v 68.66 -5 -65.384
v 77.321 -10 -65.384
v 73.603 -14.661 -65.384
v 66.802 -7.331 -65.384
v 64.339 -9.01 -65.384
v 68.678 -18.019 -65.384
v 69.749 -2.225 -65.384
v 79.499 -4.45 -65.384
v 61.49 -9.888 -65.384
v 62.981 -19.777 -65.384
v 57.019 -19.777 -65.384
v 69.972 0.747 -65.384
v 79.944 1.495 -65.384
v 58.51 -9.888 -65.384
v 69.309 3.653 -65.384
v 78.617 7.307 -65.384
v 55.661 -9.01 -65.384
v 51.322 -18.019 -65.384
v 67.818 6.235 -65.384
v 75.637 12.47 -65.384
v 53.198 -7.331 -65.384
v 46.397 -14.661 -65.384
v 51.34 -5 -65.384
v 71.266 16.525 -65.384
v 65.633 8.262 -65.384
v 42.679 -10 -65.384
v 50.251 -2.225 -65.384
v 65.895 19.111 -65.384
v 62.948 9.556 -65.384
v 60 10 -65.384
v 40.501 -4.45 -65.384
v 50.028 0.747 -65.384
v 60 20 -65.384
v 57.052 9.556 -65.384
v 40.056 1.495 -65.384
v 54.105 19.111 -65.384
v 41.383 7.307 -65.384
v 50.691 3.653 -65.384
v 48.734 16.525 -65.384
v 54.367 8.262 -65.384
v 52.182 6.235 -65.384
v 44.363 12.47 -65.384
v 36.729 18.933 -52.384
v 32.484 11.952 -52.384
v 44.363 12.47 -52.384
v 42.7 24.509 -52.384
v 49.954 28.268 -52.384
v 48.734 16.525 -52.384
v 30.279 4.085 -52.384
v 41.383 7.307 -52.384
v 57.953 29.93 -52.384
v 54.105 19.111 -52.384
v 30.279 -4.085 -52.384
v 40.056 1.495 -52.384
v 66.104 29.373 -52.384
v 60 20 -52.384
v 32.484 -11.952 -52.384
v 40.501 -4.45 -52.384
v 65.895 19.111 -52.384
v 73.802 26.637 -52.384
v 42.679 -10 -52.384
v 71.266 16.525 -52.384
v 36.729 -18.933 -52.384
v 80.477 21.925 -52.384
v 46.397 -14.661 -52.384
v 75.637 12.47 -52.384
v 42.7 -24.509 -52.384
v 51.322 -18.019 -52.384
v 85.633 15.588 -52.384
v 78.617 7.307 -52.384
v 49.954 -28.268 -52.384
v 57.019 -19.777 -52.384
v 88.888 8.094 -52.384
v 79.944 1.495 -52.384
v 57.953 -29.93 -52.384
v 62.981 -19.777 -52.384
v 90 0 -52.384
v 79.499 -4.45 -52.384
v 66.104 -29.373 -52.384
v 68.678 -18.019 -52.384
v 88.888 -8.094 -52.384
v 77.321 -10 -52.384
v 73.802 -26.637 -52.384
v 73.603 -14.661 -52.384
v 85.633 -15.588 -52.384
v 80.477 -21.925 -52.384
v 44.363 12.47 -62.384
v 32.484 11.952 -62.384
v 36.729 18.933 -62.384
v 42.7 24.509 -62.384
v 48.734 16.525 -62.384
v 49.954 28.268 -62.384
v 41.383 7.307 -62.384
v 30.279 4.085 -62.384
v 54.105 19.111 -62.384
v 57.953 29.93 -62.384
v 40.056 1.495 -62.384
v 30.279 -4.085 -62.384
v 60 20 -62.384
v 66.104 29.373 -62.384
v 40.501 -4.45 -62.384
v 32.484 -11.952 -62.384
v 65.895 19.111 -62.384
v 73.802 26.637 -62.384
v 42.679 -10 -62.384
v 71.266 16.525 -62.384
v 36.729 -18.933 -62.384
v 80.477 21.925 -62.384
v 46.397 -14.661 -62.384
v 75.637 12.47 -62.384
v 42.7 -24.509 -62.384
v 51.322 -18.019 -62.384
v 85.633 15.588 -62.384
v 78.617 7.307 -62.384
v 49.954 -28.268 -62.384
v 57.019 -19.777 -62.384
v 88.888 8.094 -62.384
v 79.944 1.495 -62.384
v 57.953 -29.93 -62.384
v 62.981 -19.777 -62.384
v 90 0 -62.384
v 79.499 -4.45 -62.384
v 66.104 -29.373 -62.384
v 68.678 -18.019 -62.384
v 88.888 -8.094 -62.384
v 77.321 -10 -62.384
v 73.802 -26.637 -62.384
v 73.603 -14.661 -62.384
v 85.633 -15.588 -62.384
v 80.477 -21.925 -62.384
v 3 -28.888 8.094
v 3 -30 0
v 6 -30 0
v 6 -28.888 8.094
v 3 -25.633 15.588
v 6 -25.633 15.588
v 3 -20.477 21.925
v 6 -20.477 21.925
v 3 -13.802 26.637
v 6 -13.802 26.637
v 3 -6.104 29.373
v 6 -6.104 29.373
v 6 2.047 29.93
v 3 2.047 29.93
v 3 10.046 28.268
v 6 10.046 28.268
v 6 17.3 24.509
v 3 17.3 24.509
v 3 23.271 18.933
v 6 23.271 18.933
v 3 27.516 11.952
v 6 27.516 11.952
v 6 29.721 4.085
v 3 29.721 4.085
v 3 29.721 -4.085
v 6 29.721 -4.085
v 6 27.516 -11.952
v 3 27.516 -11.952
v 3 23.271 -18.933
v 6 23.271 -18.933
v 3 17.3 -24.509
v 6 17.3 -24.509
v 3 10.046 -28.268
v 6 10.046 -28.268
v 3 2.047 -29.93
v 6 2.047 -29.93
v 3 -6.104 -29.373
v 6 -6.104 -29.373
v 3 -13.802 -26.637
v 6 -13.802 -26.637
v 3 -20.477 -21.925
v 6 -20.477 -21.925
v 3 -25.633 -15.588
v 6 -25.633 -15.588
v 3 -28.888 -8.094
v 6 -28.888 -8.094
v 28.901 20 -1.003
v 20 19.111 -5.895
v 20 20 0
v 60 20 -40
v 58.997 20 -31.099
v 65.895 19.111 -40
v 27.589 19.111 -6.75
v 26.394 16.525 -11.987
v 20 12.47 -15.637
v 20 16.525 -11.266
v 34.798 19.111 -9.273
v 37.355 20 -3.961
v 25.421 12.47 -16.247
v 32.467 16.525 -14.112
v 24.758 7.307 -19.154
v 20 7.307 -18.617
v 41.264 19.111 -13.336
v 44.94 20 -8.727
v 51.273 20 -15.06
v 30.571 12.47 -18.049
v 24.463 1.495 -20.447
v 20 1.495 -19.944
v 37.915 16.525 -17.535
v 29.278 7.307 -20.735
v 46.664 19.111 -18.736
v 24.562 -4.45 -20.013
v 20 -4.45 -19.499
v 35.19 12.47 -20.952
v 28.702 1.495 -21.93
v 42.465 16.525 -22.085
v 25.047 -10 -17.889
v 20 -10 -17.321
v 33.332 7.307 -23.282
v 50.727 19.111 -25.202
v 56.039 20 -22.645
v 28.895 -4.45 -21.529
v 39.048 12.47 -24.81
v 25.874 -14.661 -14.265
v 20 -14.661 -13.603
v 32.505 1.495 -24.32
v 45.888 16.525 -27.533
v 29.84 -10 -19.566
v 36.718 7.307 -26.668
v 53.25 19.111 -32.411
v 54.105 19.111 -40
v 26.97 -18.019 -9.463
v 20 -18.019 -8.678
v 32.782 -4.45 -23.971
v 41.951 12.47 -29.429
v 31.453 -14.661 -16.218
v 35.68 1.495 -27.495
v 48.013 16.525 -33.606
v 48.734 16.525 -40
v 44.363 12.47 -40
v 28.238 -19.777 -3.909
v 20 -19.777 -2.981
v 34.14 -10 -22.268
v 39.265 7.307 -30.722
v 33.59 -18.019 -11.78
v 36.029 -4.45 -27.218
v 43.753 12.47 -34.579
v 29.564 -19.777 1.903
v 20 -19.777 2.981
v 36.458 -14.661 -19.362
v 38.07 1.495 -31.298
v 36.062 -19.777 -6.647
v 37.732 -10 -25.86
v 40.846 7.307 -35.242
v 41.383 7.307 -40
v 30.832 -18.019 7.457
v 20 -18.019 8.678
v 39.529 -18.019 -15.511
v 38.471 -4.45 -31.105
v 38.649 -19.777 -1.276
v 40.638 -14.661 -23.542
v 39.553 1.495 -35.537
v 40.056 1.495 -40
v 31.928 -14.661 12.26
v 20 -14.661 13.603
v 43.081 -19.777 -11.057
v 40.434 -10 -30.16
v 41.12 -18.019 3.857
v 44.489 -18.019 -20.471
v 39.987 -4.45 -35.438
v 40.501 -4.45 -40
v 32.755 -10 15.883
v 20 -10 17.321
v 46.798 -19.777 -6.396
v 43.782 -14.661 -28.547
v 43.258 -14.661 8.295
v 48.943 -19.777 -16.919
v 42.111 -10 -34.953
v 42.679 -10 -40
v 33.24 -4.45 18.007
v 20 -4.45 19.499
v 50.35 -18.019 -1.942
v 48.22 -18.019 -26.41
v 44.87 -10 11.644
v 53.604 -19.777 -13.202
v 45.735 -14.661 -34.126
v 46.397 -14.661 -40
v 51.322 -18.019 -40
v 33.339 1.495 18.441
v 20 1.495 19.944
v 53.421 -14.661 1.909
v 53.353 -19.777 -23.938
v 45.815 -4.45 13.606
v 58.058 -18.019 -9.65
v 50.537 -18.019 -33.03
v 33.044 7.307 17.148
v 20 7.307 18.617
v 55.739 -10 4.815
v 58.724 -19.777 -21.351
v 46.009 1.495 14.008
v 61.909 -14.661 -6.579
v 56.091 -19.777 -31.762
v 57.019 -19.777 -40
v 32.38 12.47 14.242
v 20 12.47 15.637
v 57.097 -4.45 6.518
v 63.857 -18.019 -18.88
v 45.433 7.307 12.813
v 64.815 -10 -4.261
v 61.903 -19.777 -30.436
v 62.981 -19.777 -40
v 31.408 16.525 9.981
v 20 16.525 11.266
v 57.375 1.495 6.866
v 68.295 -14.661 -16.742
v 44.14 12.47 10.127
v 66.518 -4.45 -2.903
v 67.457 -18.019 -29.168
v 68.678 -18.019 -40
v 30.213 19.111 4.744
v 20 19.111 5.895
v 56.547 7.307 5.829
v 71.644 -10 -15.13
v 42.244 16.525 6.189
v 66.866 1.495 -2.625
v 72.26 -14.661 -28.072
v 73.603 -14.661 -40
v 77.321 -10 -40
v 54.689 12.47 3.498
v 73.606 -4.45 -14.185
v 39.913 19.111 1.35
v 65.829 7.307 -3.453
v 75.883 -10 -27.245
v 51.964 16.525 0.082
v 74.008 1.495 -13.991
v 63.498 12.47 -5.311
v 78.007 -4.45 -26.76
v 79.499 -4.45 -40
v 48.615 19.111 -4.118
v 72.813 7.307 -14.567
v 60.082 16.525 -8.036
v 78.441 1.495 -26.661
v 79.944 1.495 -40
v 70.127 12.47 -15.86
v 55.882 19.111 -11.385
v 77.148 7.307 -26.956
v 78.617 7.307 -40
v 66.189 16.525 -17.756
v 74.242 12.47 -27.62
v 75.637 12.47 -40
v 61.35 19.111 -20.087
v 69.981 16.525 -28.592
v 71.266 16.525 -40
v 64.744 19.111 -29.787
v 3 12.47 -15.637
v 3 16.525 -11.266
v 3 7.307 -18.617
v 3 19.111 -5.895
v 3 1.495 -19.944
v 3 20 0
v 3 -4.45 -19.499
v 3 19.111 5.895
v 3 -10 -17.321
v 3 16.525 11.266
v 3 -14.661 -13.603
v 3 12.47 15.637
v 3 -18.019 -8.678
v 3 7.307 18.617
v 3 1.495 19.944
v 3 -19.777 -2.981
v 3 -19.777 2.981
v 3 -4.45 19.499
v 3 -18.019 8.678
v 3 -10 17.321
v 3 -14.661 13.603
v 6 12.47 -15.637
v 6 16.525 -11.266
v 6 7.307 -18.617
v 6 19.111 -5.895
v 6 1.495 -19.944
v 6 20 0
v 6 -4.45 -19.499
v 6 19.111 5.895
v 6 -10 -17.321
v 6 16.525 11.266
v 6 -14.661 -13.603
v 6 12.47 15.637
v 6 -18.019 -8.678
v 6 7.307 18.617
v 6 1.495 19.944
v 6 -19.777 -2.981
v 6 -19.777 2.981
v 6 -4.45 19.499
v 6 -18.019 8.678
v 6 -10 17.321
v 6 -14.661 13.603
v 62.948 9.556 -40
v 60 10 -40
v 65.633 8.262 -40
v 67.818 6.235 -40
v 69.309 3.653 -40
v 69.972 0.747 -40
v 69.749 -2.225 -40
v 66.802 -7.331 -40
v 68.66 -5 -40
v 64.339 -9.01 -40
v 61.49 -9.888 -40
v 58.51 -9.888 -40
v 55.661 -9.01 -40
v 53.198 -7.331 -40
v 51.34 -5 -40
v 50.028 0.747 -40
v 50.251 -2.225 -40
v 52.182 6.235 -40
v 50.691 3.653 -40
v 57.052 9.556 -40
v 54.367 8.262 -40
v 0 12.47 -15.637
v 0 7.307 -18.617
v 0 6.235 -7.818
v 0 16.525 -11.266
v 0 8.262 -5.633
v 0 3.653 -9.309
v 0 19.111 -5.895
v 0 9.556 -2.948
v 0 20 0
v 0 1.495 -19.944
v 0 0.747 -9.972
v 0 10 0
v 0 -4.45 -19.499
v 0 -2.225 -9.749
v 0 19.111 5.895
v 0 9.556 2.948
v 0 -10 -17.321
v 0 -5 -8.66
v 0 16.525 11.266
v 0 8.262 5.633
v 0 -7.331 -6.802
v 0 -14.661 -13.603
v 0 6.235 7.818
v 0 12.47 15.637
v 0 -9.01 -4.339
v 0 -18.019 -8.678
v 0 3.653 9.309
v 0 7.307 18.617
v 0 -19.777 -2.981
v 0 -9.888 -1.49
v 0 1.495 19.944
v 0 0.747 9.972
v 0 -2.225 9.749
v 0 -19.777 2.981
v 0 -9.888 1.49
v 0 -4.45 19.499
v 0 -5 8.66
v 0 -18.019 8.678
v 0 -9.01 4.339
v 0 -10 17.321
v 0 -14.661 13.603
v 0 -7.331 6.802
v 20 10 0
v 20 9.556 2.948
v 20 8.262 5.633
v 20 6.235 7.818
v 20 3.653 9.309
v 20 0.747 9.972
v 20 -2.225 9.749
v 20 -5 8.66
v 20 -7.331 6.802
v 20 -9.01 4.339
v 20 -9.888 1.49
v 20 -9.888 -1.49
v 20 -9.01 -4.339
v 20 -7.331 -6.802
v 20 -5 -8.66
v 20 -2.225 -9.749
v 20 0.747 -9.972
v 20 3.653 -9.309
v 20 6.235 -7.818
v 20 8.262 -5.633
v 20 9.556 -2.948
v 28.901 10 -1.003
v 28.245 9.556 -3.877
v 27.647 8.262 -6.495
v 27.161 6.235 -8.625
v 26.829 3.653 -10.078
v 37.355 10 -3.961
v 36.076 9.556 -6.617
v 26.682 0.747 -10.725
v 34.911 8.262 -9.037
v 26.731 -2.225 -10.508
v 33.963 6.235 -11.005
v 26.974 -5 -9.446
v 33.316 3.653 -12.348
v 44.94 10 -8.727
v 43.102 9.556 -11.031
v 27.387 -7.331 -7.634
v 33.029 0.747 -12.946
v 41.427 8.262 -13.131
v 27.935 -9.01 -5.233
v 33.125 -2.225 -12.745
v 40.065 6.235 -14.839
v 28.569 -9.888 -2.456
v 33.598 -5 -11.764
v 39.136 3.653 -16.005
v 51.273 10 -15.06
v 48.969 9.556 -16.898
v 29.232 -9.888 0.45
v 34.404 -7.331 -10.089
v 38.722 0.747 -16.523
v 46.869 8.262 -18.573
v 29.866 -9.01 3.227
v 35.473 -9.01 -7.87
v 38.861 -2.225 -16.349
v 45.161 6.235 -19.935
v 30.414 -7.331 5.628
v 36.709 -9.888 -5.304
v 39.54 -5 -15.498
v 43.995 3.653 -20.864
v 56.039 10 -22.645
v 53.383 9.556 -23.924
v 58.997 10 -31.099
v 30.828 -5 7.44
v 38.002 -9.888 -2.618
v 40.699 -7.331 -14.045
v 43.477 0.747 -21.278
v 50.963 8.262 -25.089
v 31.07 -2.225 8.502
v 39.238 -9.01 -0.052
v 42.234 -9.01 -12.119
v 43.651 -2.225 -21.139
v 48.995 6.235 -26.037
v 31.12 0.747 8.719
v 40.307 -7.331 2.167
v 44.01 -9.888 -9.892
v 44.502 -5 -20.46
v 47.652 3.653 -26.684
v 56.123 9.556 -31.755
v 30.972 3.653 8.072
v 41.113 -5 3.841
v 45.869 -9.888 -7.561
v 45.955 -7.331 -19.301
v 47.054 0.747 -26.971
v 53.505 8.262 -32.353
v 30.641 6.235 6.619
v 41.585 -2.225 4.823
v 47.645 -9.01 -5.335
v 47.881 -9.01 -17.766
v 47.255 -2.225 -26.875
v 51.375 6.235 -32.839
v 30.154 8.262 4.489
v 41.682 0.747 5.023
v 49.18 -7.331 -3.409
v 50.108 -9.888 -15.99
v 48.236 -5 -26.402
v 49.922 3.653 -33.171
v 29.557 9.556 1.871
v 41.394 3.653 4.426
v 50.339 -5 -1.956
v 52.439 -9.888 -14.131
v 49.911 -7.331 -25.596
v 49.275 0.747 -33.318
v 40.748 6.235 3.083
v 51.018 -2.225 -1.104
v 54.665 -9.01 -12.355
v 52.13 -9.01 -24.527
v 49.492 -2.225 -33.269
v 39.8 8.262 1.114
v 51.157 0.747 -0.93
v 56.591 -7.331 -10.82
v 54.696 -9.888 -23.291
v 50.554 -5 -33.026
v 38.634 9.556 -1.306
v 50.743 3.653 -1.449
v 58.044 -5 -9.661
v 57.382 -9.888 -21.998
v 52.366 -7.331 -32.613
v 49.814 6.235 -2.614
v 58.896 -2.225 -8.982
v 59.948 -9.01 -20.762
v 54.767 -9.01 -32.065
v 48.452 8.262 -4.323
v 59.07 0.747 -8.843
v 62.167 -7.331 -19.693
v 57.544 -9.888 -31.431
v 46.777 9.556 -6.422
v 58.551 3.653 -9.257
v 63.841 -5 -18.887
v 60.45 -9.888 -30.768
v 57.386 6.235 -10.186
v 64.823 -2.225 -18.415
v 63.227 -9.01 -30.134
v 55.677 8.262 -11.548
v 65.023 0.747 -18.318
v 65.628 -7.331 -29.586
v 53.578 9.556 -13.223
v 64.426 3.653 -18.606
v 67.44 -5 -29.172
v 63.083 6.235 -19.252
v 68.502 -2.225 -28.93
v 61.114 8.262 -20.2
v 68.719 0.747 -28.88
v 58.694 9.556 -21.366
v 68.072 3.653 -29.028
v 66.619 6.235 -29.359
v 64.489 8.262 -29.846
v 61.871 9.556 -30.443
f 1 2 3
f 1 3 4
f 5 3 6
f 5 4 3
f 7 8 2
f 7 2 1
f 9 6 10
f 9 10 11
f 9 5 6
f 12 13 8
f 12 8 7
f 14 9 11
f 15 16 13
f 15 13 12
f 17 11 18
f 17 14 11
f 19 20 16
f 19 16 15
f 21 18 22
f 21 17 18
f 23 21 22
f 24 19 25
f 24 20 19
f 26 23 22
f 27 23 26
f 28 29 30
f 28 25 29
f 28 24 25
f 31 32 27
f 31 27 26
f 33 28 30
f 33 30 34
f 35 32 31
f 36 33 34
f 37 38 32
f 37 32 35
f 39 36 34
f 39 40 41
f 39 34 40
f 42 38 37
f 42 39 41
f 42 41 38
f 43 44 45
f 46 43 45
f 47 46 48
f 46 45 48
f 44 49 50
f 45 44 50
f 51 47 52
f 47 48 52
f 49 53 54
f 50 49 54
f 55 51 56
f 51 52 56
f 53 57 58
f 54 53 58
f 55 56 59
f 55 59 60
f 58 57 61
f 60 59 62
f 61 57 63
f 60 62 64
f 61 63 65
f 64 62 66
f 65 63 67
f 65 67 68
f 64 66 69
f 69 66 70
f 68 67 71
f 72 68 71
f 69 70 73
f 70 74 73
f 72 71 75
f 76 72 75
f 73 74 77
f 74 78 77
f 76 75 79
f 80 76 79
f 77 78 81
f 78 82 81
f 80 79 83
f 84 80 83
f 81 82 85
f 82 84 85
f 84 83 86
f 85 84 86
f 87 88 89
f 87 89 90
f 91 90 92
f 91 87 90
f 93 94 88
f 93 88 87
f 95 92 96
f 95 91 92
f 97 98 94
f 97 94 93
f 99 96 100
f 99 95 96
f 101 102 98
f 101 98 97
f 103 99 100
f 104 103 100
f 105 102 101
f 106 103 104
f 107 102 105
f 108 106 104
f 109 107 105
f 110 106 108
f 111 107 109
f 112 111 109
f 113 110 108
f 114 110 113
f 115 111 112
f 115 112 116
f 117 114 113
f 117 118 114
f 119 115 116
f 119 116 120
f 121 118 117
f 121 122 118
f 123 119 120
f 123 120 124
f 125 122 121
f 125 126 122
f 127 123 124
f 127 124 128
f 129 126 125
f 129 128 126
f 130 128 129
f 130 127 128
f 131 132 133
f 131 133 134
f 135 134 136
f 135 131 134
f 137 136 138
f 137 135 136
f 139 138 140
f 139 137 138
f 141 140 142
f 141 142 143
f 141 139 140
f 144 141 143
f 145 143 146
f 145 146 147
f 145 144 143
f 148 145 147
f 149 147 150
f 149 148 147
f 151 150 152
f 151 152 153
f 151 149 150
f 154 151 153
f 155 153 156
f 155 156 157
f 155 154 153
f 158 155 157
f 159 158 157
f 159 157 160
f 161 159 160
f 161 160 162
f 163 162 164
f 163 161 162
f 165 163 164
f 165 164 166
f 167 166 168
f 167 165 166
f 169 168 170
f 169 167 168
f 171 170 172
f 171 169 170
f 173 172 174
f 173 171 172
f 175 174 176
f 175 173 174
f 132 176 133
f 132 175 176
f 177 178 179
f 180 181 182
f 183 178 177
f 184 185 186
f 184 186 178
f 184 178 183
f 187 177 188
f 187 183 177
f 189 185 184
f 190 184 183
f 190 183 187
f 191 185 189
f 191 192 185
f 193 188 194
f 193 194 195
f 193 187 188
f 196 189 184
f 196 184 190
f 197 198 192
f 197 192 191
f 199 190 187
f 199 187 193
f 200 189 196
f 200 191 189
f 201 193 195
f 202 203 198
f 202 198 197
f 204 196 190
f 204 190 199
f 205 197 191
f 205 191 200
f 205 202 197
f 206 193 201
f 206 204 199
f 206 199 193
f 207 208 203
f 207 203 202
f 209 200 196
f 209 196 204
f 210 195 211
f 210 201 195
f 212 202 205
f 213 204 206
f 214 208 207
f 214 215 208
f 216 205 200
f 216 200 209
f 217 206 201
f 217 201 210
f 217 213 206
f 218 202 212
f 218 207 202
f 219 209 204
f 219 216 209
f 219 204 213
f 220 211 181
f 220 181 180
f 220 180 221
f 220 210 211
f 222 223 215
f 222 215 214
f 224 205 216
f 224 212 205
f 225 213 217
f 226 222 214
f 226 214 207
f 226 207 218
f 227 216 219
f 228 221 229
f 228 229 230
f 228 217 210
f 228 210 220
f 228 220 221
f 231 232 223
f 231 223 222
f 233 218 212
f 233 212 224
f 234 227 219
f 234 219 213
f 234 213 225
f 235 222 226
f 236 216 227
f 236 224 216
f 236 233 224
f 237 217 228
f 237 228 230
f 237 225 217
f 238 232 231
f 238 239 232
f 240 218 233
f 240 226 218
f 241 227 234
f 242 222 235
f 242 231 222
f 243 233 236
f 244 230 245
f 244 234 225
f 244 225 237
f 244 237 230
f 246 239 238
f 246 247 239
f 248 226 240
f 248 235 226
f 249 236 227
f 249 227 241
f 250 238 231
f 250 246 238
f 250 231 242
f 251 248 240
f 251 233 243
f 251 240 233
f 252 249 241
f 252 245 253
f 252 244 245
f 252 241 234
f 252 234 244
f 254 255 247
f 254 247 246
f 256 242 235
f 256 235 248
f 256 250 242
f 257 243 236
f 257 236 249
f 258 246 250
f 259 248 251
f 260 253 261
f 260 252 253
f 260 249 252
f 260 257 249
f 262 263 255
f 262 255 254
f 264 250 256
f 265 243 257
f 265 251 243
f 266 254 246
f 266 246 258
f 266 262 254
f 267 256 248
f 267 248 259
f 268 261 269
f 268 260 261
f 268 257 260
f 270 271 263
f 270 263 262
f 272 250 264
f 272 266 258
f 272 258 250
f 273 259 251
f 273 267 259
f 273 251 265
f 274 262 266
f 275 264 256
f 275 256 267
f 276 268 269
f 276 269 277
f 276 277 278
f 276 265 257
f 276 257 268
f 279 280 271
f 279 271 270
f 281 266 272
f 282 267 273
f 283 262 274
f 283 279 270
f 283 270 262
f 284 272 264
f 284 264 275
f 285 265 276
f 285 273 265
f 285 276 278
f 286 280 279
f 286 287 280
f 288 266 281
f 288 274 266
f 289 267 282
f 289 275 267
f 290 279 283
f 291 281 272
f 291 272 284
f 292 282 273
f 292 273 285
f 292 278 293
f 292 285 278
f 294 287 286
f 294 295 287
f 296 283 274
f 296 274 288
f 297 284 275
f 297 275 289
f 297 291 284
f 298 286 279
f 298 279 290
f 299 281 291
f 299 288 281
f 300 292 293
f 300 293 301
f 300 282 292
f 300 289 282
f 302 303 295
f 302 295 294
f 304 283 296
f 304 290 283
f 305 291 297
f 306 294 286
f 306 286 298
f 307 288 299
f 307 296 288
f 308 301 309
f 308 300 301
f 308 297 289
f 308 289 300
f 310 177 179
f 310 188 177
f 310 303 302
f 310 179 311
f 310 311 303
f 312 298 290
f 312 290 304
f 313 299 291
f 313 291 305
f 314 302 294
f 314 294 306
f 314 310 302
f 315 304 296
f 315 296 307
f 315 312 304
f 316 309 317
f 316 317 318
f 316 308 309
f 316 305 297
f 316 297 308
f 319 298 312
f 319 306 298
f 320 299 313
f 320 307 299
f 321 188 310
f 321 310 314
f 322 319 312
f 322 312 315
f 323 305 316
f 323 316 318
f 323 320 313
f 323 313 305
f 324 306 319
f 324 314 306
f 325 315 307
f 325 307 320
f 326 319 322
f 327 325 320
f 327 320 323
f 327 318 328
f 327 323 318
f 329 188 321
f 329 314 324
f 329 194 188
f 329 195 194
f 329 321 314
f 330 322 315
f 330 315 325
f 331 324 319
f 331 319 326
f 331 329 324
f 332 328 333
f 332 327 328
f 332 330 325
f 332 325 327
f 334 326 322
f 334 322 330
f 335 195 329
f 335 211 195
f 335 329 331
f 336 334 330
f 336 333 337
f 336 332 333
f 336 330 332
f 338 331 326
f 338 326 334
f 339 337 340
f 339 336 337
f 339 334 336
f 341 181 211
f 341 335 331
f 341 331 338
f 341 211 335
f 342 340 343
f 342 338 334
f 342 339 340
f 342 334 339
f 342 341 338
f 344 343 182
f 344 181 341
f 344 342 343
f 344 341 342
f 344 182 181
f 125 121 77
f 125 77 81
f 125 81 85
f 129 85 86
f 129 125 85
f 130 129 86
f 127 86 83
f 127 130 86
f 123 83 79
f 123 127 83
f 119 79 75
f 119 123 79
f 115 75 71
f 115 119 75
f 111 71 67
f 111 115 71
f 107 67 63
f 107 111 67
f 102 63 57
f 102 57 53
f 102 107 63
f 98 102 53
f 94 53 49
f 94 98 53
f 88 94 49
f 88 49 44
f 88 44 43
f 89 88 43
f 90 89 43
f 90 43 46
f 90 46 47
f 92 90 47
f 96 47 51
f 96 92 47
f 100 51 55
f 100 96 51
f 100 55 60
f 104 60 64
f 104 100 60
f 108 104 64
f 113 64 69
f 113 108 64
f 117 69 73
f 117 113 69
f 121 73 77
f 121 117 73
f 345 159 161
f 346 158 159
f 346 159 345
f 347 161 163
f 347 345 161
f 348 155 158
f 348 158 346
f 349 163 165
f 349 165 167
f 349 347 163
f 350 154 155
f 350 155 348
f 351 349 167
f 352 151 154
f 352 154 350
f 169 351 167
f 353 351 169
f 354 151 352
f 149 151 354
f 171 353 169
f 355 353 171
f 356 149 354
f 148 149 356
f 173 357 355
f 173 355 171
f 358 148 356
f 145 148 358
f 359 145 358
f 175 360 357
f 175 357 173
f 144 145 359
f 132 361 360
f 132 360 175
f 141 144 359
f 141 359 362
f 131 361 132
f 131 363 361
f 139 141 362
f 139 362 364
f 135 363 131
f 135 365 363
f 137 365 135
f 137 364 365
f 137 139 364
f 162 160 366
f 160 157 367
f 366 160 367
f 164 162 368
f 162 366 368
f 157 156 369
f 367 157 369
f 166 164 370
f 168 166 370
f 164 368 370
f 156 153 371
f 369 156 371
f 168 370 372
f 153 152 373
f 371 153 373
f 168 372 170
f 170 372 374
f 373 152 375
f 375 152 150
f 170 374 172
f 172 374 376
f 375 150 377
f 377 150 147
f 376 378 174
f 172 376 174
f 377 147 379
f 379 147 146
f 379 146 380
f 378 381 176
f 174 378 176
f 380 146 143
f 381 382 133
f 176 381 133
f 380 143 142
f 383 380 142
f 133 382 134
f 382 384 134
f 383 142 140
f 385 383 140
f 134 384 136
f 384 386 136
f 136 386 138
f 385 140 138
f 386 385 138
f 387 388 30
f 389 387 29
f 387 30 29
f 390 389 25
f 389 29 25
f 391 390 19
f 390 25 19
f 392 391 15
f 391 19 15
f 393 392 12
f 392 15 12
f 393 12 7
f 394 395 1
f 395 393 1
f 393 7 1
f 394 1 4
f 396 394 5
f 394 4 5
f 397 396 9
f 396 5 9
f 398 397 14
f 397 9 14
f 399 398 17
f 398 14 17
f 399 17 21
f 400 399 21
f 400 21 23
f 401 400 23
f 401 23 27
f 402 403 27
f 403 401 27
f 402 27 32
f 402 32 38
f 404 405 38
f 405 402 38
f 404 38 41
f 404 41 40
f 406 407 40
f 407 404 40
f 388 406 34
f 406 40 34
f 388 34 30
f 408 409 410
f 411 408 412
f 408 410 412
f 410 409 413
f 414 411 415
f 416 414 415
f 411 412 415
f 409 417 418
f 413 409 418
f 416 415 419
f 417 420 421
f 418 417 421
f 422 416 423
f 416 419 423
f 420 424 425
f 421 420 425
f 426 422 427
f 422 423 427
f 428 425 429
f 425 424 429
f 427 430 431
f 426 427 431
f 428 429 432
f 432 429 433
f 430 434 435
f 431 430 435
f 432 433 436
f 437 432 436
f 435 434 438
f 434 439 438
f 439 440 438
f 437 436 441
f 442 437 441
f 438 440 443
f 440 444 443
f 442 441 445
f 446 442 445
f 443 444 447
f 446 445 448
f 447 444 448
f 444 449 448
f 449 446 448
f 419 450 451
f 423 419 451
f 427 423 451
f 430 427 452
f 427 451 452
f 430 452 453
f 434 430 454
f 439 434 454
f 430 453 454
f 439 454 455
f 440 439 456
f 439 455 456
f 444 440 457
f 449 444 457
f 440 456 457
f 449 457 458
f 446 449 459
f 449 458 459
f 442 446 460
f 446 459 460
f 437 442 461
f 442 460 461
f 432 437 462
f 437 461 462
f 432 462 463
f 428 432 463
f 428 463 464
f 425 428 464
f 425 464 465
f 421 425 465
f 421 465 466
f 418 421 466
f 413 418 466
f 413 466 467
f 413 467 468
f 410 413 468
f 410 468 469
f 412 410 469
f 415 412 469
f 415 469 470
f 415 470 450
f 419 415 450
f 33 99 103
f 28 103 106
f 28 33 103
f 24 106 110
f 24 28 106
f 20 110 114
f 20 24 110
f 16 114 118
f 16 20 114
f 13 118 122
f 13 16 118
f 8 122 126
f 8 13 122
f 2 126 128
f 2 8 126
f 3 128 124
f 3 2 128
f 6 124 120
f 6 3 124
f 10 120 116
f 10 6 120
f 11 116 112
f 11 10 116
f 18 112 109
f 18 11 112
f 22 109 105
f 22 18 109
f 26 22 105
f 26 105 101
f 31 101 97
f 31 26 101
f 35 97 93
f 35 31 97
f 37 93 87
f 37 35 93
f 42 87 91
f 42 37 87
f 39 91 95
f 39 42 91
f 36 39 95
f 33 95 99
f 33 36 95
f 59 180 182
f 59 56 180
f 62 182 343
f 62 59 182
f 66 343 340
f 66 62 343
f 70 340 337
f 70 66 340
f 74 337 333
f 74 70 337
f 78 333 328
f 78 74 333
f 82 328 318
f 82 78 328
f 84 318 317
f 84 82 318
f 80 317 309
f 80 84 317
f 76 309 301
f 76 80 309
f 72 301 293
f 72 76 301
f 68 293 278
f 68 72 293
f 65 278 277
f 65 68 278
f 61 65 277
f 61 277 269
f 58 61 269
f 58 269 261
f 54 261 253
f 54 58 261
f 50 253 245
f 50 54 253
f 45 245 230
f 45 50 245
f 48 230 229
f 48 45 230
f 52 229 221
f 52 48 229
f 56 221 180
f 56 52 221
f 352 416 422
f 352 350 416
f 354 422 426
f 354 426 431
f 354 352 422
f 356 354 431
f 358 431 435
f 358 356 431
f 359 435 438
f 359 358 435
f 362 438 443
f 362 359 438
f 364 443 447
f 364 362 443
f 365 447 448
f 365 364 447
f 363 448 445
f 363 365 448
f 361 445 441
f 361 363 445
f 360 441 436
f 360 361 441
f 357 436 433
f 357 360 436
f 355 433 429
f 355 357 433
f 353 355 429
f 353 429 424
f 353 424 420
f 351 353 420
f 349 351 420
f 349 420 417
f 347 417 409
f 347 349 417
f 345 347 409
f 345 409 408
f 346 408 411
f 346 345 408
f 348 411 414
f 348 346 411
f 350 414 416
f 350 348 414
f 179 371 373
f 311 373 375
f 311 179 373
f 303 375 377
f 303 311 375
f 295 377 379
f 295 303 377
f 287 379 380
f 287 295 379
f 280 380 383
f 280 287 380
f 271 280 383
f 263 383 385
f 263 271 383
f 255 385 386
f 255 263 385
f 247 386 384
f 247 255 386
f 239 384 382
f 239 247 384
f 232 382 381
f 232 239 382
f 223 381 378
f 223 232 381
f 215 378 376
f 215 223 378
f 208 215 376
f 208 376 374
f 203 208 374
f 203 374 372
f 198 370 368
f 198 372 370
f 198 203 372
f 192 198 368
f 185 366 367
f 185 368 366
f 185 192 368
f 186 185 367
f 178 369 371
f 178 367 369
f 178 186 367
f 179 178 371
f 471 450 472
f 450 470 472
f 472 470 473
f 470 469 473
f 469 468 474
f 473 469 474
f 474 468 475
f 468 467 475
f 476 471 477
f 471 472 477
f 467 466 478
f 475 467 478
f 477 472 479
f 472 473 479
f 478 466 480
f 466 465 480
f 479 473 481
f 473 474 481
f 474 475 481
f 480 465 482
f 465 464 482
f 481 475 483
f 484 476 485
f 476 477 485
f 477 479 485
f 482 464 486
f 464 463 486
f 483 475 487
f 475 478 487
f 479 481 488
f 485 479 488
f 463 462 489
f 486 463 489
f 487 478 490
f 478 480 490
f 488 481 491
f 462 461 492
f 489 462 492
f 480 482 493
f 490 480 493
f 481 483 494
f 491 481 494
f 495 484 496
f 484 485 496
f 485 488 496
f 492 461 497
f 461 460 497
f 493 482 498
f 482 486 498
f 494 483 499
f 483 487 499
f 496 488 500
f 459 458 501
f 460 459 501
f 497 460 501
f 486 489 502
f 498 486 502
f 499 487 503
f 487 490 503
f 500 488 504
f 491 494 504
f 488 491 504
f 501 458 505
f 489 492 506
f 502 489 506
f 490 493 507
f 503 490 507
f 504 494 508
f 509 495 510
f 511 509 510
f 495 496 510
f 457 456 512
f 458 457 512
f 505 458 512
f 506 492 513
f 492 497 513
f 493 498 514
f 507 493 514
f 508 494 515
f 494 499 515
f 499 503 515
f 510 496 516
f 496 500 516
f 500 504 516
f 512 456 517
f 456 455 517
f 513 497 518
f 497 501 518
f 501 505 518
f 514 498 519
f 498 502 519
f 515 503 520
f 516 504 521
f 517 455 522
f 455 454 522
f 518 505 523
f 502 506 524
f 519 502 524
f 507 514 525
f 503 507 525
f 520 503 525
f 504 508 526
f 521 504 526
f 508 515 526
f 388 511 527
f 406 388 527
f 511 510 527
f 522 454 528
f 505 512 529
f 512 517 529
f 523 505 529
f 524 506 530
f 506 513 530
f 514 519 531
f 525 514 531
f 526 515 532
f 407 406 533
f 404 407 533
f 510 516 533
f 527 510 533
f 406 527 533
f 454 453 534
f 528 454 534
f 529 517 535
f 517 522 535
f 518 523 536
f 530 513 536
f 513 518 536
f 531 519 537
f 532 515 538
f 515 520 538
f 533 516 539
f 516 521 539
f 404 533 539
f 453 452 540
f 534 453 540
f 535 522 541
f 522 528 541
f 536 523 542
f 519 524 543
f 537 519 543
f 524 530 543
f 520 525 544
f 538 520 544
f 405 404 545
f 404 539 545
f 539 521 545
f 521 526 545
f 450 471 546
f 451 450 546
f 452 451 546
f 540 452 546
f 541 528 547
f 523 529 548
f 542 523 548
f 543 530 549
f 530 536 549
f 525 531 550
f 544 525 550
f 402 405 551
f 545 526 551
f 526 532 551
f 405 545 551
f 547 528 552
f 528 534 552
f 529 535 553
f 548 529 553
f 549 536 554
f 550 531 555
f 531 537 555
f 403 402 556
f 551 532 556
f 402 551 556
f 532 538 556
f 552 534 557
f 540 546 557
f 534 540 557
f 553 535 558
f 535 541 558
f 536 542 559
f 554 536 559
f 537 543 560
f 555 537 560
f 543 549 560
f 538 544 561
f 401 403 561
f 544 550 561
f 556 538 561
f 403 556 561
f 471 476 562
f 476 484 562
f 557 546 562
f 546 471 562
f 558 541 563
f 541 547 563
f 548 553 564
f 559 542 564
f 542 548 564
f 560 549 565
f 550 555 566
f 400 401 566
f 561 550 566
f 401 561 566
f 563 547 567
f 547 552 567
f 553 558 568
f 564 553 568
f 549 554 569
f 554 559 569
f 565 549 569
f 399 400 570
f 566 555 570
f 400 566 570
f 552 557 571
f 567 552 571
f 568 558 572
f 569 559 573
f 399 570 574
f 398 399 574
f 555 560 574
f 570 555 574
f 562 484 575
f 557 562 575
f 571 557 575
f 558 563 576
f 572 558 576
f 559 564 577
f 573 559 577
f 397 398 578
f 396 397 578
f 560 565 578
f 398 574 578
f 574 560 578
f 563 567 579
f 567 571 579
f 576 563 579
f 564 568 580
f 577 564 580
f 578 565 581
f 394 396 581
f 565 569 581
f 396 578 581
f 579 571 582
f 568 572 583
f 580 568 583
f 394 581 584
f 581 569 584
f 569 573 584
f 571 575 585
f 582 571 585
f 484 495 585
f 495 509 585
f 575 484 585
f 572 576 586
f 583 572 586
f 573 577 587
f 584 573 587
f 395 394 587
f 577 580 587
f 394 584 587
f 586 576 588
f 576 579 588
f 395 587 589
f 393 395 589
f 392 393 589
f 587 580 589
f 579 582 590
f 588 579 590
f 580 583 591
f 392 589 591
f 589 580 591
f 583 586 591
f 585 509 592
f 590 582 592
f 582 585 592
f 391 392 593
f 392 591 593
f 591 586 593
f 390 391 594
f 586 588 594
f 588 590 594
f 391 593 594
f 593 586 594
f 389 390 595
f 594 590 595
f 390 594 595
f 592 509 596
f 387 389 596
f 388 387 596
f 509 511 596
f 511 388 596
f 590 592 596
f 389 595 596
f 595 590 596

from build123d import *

# Parameters (mm, degrees)
F0_R     = 20
F0_R_2   = 10
F4_R     = 30
F4_R_2   = 20
F5_DEPTH = 3
F7_R     = 30
F7_R_2   = 20
F8_DEPTH = 10


with BuildPart() as f2:
    # F2: sweep along a path in F1
    with BuildLine(Plane.XZ) as f2_path:
        Line((0, 0), (20, 0))
        ThreePointArc((20, 0), (48.2842712475, -11.7157287525), (60, -40))
        Line((60, -40), (60, -65.3837376879))
    # F0 (on Right) → F2 (sweep)
    with BuildSketch(Plane.YZ):
        Circle(F0_R)
        Circle(F0_R_2, mode=Mode.SUBTRACT)
    sweep(path=f2_path.line)

    # F4 (on offset) → F5 (join)
    with BuildSketch(Plane(origin=(3, 0, 0), x_dir=(0, -1, 0), z_dir=(-1, 0, 0))):
        Circle(F4_R)
        Circle(F4_R_2, mode=Mode.SUBTRACT)
    extrude(amount=-F5_DEPTH)

    # F7 (on offset) → F8 (join)
    with BuildSketch(Plane(origin=(0, 0, -62.3837376879), x_dir=(1, 0, 0), z_dir=(0, 0, -1))):
        with Locations((60, 0)):
            Circle(F7_R)
        with Locations((60, 0)):
            Circle(F7_R_2, mode=Mode.SUBTRACT)
    extrude(amount=-F8_DEPTH)


solid = f2.part
